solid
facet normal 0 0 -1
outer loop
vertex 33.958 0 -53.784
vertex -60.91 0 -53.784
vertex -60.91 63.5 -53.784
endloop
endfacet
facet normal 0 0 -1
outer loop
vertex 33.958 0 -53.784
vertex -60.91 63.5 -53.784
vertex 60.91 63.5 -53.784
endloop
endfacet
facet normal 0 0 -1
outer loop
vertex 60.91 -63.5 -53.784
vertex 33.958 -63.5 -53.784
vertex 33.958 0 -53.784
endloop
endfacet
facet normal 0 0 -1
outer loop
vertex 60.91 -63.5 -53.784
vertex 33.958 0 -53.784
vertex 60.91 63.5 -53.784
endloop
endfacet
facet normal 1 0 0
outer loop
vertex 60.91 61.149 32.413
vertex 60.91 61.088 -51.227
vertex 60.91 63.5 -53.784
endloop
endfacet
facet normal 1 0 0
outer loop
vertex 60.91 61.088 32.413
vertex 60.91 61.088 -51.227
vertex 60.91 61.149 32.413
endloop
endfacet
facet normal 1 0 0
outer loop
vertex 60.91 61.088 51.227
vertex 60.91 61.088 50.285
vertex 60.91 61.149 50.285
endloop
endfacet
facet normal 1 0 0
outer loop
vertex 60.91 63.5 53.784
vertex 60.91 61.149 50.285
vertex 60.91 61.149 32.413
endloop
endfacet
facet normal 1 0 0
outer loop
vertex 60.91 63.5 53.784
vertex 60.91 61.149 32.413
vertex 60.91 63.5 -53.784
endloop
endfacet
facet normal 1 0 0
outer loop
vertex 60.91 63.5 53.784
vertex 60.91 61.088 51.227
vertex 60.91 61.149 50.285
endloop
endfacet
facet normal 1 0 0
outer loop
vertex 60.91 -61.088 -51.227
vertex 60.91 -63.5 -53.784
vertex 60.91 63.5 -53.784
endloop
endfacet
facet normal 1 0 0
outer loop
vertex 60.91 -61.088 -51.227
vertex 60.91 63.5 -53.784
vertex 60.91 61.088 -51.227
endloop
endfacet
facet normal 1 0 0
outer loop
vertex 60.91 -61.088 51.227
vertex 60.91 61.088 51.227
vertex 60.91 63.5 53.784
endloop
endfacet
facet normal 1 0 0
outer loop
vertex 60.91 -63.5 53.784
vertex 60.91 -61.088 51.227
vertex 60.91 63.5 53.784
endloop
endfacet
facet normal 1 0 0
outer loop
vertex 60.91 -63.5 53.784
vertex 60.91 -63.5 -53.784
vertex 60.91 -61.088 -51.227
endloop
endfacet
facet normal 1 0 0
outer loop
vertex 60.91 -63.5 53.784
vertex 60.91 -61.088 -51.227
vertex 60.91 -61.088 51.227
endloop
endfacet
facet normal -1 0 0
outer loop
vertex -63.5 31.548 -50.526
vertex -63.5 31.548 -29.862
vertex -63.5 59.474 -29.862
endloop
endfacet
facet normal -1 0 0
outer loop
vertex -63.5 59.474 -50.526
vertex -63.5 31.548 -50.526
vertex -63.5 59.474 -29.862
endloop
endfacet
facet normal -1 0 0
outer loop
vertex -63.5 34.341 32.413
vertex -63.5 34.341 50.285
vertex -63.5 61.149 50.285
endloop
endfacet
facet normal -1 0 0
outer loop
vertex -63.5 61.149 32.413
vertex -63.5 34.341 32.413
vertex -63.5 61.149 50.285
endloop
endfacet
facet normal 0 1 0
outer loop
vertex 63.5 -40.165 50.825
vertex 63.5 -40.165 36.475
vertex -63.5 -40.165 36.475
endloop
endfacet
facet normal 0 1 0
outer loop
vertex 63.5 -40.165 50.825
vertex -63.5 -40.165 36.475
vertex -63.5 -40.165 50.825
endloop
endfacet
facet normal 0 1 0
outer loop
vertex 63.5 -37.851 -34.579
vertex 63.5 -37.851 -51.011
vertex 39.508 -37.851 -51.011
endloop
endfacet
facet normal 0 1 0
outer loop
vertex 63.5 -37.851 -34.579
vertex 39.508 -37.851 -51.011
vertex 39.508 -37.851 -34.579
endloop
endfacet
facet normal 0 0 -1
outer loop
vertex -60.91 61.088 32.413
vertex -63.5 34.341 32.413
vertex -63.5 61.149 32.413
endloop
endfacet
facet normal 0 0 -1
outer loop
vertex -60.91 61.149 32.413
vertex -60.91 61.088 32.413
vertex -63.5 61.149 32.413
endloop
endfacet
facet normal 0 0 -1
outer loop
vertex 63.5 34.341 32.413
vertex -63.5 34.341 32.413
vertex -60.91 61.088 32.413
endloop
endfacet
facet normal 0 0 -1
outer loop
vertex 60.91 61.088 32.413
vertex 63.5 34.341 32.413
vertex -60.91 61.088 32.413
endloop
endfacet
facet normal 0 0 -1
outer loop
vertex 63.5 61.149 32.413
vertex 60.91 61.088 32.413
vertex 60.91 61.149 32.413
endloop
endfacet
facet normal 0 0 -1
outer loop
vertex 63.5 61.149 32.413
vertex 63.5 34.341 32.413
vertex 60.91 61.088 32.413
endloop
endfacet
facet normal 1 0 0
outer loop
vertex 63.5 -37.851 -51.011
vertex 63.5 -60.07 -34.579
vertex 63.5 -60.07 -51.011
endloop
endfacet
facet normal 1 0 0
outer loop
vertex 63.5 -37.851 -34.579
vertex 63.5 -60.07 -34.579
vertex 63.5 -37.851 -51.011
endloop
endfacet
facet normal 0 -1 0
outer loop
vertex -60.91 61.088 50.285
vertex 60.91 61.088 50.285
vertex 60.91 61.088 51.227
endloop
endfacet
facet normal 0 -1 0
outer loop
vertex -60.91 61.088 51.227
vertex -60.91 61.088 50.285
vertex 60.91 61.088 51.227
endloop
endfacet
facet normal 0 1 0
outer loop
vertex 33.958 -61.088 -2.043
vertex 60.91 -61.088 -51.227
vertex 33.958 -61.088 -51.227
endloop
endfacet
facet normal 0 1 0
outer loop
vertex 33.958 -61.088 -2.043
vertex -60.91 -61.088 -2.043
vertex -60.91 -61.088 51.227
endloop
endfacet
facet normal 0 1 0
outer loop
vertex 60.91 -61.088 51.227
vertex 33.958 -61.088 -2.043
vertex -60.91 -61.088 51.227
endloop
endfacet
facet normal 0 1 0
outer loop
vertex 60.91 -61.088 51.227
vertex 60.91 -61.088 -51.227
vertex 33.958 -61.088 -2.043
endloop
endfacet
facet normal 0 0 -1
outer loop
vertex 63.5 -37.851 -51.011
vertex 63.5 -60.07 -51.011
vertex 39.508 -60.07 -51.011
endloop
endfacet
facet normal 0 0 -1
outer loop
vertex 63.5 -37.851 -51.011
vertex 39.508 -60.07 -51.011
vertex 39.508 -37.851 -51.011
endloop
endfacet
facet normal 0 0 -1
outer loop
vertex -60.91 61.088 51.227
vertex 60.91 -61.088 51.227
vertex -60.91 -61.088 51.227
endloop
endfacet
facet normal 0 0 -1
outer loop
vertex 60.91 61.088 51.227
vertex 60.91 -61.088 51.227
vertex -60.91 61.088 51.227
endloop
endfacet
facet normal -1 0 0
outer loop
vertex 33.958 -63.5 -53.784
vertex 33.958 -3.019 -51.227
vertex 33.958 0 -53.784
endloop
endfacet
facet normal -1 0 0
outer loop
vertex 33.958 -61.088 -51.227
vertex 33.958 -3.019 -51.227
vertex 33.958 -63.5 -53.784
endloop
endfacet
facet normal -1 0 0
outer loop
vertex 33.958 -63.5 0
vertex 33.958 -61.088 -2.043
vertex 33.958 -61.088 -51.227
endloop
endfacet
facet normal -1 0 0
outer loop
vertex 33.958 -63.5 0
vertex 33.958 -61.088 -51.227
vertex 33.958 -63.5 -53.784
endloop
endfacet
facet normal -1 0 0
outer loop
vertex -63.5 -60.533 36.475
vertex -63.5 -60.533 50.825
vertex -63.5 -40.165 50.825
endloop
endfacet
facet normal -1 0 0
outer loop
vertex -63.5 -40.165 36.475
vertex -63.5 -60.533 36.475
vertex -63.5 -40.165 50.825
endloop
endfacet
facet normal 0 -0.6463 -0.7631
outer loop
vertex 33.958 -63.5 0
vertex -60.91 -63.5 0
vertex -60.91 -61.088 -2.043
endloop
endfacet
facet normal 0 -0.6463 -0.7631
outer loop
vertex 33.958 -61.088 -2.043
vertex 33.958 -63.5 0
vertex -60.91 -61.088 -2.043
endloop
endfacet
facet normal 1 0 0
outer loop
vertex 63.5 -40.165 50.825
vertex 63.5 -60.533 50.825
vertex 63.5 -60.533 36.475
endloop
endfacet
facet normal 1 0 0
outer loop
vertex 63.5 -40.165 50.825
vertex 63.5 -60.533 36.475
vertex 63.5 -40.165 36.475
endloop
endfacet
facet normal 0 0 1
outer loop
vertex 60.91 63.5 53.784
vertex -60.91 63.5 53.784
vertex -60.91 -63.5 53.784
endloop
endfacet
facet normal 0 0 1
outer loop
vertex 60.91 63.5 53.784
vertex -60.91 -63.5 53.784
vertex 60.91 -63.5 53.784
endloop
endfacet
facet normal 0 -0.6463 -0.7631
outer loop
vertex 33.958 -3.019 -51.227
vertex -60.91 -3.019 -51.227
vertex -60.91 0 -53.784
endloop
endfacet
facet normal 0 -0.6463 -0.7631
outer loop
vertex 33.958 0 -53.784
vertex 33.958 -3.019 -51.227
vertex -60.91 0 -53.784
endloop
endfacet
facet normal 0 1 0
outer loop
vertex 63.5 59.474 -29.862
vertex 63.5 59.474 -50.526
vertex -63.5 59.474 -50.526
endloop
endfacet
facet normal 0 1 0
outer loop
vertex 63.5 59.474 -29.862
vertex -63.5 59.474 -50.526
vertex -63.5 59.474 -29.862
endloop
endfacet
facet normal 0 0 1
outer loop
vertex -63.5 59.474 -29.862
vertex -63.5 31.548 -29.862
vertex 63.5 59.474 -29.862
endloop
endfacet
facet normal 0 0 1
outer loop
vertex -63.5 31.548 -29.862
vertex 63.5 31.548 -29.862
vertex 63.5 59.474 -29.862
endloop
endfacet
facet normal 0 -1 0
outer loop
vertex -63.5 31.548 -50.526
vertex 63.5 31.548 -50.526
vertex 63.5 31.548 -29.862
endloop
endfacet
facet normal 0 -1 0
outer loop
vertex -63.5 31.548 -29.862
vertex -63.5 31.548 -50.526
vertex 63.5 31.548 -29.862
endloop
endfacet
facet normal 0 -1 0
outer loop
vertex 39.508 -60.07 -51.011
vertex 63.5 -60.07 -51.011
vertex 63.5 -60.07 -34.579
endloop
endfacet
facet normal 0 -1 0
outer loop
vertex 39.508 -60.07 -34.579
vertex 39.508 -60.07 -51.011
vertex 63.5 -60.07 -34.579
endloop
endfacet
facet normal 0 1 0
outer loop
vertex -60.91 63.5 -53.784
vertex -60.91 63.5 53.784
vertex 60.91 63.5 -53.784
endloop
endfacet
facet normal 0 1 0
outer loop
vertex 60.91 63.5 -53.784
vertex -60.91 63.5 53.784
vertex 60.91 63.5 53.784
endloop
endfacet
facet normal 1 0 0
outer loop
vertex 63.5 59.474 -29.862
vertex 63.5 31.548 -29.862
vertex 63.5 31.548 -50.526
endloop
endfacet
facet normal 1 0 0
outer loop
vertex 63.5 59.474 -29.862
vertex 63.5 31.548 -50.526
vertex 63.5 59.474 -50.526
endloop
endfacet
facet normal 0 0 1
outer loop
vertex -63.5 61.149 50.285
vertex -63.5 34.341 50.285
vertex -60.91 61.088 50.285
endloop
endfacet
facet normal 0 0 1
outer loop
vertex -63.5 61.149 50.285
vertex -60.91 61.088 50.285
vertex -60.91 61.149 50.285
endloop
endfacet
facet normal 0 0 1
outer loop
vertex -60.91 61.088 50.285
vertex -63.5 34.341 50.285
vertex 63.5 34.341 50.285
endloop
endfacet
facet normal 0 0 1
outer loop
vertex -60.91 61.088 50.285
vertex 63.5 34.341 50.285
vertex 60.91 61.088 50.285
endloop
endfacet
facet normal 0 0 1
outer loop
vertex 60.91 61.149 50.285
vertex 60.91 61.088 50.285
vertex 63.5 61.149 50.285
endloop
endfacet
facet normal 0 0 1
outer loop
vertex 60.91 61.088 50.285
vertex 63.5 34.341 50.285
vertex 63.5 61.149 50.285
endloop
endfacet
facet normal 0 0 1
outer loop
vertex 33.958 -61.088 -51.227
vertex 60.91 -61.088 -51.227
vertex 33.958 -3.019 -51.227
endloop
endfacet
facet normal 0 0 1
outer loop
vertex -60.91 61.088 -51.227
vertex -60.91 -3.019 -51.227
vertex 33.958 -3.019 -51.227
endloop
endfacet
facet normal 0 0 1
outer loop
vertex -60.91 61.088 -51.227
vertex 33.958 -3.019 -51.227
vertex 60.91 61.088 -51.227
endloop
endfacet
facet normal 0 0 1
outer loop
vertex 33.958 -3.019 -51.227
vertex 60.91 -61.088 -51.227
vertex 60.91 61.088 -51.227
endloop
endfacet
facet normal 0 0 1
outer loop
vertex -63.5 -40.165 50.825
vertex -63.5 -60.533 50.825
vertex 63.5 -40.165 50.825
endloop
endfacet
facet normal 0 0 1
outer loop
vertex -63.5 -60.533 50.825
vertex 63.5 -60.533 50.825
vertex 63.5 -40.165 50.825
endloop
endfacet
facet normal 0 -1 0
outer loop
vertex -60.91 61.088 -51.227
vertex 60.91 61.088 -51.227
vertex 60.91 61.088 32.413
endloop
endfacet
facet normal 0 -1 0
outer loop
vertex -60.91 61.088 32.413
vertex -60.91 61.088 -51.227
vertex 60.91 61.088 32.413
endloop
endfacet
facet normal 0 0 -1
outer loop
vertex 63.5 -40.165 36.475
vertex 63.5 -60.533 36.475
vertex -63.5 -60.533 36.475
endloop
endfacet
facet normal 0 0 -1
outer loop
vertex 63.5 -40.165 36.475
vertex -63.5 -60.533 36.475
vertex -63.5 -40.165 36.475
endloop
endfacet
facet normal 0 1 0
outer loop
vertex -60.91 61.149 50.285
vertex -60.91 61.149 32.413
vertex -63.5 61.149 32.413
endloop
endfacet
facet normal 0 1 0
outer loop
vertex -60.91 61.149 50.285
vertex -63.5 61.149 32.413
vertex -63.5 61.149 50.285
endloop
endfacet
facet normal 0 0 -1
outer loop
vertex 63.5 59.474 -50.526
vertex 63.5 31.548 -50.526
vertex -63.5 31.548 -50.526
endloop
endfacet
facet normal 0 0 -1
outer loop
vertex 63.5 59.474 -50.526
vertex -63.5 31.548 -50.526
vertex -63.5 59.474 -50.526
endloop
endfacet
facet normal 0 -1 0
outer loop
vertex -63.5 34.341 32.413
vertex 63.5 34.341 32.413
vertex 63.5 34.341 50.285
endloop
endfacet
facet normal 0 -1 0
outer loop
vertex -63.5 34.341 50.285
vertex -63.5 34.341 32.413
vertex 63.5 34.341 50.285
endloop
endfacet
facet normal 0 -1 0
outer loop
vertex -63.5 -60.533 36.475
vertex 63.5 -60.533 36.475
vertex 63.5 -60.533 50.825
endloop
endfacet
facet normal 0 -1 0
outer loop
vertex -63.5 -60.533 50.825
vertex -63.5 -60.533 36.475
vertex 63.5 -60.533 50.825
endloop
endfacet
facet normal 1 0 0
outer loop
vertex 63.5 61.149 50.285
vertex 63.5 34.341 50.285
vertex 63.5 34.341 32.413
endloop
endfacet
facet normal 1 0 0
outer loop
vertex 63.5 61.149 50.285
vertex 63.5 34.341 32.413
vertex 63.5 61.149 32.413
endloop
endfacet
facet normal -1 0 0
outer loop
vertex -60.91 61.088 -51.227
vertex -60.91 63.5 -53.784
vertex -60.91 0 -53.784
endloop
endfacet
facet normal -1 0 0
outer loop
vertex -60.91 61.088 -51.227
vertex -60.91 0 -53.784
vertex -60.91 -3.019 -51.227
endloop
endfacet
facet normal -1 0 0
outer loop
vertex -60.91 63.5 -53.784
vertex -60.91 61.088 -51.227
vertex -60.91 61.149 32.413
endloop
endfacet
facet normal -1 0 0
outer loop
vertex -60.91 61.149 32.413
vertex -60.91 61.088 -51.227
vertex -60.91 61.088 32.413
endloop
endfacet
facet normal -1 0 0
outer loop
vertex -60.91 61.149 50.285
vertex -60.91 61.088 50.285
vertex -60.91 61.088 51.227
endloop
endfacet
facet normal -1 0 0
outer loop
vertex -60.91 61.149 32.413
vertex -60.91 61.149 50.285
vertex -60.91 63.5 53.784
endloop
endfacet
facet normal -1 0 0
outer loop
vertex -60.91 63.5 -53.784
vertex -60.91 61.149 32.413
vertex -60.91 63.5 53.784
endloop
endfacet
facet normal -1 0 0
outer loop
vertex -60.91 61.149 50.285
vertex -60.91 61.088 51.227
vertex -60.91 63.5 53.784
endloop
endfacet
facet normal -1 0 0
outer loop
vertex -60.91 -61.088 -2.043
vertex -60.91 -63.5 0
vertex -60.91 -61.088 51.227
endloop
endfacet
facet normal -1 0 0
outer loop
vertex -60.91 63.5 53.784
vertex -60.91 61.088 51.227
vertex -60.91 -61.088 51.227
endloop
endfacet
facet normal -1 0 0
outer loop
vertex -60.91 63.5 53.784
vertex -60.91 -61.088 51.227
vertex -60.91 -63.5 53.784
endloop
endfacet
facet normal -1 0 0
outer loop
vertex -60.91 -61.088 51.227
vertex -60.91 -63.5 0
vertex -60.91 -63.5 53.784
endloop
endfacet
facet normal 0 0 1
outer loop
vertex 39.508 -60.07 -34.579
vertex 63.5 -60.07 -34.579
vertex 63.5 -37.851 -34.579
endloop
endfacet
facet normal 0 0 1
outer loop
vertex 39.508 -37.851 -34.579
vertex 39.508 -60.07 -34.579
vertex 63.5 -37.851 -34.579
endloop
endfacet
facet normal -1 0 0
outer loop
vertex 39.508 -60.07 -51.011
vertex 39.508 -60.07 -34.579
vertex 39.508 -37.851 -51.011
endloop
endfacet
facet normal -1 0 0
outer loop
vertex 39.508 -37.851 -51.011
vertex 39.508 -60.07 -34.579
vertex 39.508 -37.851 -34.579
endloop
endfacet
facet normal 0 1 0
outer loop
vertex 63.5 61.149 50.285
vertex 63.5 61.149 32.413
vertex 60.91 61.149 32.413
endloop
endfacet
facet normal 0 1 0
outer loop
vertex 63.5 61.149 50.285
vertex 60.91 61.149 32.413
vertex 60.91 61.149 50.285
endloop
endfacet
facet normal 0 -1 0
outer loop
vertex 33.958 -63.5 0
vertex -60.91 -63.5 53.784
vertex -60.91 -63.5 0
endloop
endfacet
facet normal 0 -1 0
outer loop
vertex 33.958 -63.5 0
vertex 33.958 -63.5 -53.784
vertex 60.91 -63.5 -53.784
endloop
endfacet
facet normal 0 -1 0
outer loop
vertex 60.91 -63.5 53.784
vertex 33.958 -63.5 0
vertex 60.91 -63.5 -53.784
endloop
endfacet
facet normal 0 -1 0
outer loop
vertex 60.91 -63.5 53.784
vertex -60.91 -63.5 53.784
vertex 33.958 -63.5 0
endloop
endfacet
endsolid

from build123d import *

# Parameters (mm, degrees)
F0_W     = 121.8193843961
F0_H     = 107.5678020716
F1_DEPTH = 63.5
F3_DEPTH = 94.8674306273
F5_W     = 122.1761479974
F5_H     = 102.4538055062
F6_DEPTH = 635
F7_W     = 20.3673020005
F7_H     = 14.3496990204
F8_DEPTH = 63.5
F7_W_2   = 22.2188573153
F7_H_2   = 16.4326854228
F7_W_3   = 26.8085598946
F7_H_3   = 17.8723633289
F7_W_4   = 27.92558074
F7_H_4   = 20.6649303436
F9_DEPTH = 103.008158505


with BuildPart() as f1:
    # F0 (on Front) → F1 (new body, symmetric)
    with BuildSketch(Plane.XZ):
        Rectangle(F0_W, F0_H)
    extrude(amount=F1_DEPTH, both=True)

    # F2 (on face) → F3 (cut)
    with BuildSketch(Plane(origin=(-60.909692198, 0, 0), x_dir=(0, -1, 0), z_dir=(-1, 0, 0))):
        Polygon((63.5, 0), (0, -53.7839010358), (63.5, -53.7839010358), align=None)
    extrude(amount=-F3_DEPTH, mode=Mode.SUBTRACT)

    # F5 (on face) → F6 (cut)
    with BuildSketch(Plane.YZ.offset(60.909692198)):
        Rectangle(F5_W, F5_H)
    extrude(amount=-F6_DEPTH, mode=Mode.SUBTRACT)

    # F7 (on Right) → F8, piece 3 (join, symmetric)
    with BuildSketch(Plane.YZ):
        with Locations((47.744974494, 41.3487032056)):
            Rectangle(F7_W_3, F7_H_3)
    extrude(amount=F8_DEPTH, both=True)


with BuildPart() as f8:
    # F7 (on Right) → F8 (new body, symmetric)
    with BuildSketch(Plane.YZ):
        with Locations((-50.349149853, 43.6503365636)):
            Rectangle(F7_W, F7_H)
    extrude(amount=F8_DEPTH, both=True)


with BuildPart() as f8b:
    # F7 (on Right) → F8, piece 2 (new body, symmetric)
    with BuildSketch(Plane.YZ):
        with Locations((-48.9604605273, -42.7950013518)):
            Rectangle(F7_W_2, F7_H_2)
    extrude(amount=F8_DEPTH, both=True)

    # F9 (cut): a face of the model
    f9_faces = [f8b.faces().sort_by_distance(p)[0] for p in [
        (-63.5, -48.9604605273, -42.7950013518),
    ]]
    extrude(f9_faces, amount=-F9_DEPTH, mode=Mode.SUBTRACT)


with BuildPart() as f8c:
    # F7 (on Right) → F8, piece 4 (new body, symmetric)
    with BuildSketch(Plane.YZ):
        with Locations((45.5109328032, -40.1939749718)):
            Rectangle(F7_W_4, F7_H_4)
    extrude(amount=F8_DEPTH, both=True)


solid = Compound([f1.part, f8.part, f8b.part, f8c.part])
